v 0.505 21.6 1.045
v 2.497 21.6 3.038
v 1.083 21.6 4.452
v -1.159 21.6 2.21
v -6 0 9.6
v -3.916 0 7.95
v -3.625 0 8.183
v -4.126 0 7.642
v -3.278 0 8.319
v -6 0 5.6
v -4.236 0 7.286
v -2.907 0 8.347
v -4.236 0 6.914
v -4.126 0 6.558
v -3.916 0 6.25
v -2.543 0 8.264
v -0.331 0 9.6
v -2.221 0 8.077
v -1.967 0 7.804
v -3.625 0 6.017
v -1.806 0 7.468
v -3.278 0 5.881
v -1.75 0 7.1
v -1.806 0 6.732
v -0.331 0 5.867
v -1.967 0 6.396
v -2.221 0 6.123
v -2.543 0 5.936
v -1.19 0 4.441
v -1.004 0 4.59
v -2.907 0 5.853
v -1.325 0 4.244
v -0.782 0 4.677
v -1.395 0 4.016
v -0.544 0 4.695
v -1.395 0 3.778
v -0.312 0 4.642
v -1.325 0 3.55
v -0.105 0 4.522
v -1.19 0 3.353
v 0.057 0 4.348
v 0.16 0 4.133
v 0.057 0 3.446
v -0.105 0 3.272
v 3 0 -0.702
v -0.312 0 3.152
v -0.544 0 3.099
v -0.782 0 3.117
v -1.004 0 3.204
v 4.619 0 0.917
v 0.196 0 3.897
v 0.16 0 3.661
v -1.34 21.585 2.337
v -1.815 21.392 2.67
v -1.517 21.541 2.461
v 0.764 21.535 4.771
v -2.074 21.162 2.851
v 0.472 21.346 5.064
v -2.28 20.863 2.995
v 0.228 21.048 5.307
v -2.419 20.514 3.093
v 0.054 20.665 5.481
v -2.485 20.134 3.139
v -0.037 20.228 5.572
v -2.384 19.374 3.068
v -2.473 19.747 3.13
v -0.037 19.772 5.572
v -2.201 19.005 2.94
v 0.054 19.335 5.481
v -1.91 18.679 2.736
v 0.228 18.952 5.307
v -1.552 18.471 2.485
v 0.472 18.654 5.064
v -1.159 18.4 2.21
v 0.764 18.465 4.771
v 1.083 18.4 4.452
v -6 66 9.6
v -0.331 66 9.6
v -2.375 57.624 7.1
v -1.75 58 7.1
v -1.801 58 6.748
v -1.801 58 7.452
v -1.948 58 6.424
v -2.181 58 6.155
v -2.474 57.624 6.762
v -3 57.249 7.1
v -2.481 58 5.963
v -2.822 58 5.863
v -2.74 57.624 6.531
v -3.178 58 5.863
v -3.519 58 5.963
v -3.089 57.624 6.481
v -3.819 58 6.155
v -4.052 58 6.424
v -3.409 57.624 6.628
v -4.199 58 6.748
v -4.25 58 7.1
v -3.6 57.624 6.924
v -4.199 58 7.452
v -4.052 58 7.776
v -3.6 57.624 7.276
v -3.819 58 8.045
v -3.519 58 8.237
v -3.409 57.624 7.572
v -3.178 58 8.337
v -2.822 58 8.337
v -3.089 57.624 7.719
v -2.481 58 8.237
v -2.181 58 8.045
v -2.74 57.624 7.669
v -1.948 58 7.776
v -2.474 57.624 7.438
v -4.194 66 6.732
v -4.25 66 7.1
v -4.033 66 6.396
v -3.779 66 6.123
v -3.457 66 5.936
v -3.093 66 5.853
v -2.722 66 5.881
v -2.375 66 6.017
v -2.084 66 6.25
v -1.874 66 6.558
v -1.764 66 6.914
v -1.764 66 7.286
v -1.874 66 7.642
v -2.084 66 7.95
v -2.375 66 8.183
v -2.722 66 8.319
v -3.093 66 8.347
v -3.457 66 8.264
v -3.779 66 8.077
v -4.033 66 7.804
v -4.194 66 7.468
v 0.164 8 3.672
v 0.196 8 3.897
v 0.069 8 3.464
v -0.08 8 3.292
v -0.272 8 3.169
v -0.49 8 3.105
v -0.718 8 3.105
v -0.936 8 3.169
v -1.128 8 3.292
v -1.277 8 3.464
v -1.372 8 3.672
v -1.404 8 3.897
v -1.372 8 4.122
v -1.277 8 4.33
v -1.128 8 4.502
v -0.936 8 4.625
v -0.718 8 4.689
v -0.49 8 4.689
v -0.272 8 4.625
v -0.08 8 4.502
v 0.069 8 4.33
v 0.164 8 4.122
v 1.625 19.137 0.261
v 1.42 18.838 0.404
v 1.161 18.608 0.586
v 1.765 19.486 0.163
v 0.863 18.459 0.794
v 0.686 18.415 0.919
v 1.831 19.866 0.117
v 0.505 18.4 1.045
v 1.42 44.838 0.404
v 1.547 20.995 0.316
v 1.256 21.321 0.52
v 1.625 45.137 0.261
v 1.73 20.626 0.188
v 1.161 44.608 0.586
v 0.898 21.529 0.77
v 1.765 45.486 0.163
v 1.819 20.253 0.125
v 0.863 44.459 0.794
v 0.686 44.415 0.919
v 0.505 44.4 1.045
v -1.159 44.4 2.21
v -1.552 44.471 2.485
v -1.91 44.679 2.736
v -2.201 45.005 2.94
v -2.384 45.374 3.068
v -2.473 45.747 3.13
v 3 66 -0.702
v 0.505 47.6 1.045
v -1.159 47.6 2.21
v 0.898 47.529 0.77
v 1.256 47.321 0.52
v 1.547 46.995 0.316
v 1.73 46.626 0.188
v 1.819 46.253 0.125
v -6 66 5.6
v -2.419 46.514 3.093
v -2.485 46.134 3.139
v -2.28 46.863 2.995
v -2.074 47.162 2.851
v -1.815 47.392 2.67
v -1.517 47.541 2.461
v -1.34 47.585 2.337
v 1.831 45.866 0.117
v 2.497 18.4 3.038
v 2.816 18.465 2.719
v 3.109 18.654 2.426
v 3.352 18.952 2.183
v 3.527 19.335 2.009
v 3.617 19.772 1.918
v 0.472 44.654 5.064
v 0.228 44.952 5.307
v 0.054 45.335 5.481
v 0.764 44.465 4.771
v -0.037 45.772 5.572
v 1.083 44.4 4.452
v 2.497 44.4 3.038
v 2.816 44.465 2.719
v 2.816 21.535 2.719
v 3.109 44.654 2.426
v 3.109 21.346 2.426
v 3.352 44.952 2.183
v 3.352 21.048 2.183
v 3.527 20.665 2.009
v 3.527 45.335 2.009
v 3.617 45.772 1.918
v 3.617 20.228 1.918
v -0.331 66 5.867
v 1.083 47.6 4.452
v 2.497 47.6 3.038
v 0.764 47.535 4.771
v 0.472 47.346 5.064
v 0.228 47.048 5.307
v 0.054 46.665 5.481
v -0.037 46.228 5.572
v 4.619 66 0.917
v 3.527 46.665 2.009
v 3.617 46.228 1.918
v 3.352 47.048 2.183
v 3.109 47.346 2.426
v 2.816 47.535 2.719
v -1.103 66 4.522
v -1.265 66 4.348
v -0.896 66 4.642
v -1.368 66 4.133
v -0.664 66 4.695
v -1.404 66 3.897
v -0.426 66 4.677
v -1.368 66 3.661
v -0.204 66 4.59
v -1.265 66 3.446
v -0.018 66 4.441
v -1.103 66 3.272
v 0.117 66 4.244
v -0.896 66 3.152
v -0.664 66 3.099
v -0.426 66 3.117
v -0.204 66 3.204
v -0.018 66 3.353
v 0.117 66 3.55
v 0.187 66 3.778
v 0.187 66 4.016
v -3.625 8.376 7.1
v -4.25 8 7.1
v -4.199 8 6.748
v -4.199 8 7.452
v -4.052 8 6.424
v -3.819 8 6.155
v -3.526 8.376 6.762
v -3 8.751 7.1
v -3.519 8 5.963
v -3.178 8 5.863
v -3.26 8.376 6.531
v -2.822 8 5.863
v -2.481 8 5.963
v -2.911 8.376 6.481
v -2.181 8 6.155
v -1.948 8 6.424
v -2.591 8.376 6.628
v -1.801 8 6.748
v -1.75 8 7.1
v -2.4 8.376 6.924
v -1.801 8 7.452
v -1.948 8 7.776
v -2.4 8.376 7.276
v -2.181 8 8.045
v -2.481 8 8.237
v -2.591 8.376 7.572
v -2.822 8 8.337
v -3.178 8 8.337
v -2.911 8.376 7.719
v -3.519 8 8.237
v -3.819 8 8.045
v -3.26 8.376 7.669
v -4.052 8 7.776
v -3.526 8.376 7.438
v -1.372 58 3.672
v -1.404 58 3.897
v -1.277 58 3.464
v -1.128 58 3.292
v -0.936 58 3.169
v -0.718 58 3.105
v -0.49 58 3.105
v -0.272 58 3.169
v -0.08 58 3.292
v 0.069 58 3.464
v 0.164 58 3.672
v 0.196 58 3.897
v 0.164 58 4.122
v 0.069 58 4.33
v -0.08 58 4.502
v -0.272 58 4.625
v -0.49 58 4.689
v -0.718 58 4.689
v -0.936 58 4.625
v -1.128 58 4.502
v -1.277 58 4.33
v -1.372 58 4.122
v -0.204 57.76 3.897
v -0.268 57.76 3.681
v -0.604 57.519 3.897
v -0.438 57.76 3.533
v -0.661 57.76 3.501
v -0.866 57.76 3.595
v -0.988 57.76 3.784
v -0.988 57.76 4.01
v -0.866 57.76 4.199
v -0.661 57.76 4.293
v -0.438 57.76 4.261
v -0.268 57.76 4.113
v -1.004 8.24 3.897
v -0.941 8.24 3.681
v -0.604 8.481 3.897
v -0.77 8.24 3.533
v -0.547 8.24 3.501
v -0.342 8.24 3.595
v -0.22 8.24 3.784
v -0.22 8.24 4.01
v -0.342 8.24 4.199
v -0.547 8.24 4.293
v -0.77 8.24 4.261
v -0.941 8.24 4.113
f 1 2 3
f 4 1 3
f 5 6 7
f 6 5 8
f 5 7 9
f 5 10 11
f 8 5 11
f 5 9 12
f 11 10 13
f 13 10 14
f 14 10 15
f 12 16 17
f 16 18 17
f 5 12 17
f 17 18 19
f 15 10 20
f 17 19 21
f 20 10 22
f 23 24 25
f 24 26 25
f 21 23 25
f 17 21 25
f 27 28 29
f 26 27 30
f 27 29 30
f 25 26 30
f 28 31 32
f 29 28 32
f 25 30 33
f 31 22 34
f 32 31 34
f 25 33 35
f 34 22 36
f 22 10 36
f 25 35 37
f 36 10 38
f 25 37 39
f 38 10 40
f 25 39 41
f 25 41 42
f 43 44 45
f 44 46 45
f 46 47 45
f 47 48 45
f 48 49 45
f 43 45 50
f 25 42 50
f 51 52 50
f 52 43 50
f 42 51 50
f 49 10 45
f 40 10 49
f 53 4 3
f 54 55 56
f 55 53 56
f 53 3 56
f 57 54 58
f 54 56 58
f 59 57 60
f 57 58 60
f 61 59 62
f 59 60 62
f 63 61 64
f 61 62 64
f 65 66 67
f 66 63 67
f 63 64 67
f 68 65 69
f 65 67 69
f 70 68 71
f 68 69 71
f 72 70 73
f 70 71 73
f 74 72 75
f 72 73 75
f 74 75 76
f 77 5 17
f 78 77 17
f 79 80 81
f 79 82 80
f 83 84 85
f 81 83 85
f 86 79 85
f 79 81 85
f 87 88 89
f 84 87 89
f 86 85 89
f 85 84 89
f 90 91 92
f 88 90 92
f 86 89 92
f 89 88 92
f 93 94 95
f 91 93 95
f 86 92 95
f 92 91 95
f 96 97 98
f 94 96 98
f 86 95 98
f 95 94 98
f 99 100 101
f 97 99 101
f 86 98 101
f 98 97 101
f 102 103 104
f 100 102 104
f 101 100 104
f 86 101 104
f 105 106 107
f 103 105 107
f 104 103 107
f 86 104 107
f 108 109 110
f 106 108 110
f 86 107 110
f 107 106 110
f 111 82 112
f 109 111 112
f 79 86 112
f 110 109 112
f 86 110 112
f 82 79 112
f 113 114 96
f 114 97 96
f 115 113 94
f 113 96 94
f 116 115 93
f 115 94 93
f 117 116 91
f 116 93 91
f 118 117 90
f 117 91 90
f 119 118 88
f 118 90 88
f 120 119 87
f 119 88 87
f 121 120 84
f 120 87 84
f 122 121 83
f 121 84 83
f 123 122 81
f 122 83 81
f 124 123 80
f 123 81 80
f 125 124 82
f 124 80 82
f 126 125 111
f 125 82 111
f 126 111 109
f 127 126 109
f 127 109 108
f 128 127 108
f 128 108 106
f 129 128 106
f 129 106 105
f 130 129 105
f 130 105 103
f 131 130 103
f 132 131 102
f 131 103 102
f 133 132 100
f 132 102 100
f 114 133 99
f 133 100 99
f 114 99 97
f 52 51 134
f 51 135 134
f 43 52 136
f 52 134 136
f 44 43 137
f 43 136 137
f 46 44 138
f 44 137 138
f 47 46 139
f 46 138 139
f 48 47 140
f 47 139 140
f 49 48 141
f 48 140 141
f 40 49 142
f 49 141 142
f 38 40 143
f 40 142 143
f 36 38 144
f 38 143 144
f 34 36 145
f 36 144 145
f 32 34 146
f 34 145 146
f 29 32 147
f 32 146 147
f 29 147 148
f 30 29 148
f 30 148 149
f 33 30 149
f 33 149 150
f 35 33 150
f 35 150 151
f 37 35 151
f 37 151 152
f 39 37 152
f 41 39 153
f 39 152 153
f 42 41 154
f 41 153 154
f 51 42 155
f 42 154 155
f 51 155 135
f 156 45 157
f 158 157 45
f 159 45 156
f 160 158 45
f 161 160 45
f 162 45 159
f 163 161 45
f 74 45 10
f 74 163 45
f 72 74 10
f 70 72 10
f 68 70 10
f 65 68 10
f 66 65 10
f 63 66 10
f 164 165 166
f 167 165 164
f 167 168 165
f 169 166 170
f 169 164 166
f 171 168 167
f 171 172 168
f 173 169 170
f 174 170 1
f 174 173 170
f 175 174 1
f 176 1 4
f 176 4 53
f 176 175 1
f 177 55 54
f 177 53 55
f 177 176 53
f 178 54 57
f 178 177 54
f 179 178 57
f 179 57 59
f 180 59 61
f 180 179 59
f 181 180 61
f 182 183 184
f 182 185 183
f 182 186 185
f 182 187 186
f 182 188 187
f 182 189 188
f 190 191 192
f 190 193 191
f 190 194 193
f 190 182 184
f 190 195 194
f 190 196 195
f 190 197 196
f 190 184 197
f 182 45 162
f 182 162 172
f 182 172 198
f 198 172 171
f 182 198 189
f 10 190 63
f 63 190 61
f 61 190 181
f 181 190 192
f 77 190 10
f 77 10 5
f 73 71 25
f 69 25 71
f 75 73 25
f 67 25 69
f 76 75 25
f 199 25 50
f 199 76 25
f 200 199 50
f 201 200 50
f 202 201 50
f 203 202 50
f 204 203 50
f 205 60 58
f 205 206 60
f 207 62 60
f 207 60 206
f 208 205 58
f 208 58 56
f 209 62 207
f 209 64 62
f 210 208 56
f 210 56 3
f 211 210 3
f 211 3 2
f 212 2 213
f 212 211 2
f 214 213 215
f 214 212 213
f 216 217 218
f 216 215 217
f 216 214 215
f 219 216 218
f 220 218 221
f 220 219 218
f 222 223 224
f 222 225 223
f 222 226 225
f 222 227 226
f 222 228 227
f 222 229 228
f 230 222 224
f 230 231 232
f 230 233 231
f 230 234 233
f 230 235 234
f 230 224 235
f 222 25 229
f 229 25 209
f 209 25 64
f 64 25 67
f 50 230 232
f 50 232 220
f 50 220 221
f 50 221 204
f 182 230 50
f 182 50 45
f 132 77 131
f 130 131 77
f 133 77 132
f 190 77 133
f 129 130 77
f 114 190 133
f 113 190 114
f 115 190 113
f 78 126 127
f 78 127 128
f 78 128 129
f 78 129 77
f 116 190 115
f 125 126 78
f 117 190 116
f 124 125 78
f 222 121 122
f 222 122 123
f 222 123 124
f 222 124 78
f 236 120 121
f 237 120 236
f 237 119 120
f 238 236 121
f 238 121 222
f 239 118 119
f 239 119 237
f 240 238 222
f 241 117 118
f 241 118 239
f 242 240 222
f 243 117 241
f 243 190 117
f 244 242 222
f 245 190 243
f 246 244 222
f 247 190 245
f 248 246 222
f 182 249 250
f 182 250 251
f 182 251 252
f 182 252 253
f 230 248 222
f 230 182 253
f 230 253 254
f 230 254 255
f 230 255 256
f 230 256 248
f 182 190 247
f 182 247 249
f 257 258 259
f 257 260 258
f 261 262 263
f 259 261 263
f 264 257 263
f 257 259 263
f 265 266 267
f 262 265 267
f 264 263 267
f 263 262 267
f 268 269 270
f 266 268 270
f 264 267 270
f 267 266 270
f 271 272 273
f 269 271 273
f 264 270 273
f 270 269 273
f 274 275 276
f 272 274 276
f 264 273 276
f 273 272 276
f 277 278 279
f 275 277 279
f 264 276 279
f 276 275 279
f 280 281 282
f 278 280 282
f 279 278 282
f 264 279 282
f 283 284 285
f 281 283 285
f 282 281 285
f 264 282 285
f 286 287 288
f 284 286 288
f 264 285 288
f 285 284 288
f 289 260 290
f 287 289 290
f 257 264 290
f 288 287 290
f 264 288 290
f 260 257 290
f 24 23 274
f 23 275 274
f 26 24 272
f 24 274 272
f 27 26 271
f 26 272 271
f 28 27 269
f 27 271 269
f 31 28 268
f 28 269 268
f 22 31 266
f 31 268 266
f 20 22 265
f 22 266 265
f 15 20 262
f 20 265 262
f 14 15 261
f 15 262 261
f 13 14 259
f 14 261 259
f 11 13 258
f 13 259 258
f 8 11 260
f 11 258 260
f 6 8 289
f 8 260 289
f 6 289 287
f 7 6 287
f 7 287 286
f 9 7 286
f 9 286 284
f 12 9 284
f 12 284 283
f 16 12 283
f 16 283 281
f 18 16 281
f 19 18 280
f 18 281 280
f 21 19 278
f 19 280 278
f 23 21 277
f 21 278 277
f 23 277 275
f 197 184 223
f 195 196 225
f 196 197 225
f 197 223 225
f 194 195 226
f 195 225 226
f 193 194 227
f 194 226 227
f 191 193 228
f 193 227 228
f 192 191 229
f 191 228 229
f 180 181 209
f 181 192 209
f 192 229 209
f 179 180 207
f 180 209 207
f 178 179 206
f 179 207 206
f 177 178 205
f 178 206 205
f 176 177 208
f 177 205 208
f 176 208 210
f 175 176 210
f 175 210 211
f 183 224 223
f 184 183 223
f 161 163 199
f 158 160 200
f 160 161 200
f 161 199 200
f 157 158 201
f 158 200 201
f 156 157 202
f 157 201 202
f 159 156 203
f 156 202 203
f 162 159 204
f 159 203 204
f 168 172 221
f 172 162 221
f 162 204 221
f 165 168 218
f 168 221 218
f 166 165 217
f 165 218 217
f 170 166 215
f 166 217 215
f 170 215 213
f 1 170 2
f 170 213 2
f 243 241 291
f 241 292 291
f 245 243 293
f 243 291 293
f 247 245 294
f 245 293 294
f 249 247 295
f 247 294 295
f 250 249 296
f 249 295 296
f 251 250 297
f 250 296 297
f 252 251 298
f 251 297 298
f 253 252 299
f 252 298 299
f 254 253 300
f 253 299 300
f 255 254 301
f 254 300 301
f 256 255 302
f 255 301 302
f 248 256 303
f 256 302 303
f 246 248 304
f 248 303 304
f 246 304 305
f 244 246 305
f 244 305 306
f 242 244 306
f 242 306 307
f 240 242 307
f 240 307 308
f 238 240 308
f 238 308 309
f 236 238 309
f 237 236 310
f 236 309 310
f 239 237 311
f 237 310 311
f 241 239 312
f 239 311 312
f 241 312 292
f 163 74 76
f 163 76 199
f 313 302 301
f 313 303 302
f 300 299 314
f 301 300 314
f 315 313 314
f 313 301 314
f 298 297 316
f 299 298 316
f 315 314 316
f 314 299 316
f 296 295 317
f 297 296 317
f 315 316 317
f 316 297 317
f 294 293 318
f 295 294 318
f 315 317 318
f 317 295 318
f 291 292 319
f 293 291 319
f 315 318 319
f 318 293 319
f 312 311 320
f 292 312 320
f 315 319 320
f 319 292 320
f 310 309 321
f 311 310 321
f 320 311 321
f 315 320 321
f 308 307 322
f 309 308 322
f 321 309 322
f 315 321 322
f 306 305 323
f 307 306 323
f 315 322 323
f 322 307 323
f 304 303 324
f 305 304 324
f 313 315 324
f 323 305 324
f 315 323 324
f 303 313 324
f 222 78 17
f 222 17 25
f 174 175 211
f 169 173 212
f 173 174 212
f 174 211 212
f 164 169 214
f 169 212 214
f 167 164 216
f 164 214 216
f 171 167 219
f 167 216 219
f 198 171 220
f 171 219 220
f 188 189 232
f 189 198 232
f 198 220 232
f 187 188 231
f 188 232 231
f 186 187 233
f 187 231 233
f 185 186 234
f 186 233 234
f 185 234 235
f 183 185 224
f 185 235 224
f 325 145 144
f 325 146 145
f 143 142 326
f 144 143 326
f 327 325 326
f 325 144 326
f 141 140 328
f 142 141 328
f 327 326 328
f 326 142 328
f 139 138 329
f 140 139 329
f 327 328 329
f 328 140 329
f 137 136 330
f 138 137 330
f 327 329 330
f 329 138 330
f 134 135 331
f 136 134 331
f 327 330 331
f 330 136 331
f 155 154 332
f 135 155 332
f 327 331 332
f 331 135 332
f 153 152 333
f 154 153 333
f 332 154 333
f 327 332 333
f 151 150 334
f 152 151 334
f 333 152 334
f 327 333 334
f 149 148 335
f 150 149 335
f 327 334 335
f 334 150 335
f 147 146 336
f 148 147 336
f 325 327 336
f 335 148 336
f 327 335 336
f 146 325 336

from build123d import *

# Parameters (mm, degrees)
BOSS_EXTRUDE1_DEPTH             = 66
CUT_EXTRUDE1_DEPTH              = 9.653149759
CUT_EXTRUDE2_REACH              = 10.653
F_2_5_2_5_DIAMETER_HOLE1_D      = 2.5
F_2_5_2_5_DIAMETER_HOLE1_DEPTH  = 8
F_2_5_2_5_DIAMETER_HOLE1_TIP    = 0.751075774
TAP_DRILL_FOR_M2X0_4_TAP1_D     = 1.6
TAP_DRILL_FOR_M2X0_4_TAP1_DEPTH = 8
TAP_DRILL_FOR_M2X0_4_TAP1_TIP   = 0.480688495
F_2_5_2_5_DIAMETER_HOLE2_D      = 2.5
F_2_5_2_5_DIAMETER_HOLE2_DEPTH  = 8
F_2_5_2_5_DIAMETER_HOLE2_TIP    = 0.751075774
TAP_DRILL_FOR_M2X0_4_TAP2_D     = 1.6
TAP_DRILL_FOR_M2X0_4_TAP2_DEPTH = 8
TAP_DRILL_FOR_M2X0_4_TAP2_TIP   = 0.480688495


with BuildPart() as part:
    # Sketch1 → Boss-Extrude1 (new body)
    with BuildSketch(Plane(origin=(0, 66, 0), x_dir=(1, 0, 0), z_dir=(0, 1, 0))):
        Polygon((2.999999997, 0.701867841), (-6, -5.599999997), (-6, -9.6), (-0.331046591, -9.6), (-0.331046591, -5.866580498), (4.618700872, -0.916833034), align=None)
    extrude(amount=-BOSS_EXTRUDE1_DEPTH)

    # Sketch2 → Cut-Extrude1 (cut, through all)
    with BuildSketch(Plane(origin=(2.767766953, 0, 2.767766953), x_dir=(0.707106781, 0, -0.707106781), z_dir=(0.707106781, 0, 0.707106781))):
        with BuildLine():
            Line((-0.382384145, 47.599999993), (-2.382384145, 47.599999993))
            ThreePointArc((-2.382384145, 47.599999993), (-3.982384137, 46.000000001), (-2.382384145, 44.400000009))
            Line((-2.382384145, 44.400000009), (-0.382384145, 44.400000009))
            ThreePointArc((-0.382384145, 44.400000009), (1.217615847, 46.000000001), (-0.382384145, 47.599999993))
        make_face()
    extrude(amount=-CUT_EXTRUDE1_DEPTH, mode=Mode.SUBTRACT)

    # Sketch3 → Cut-Extrude2 (cut, up to next)
    with BuildSketch(Plane(origin=(2.767766953, 0, 2.767766953), x_dir=(0.707106781, 0, -0.707106781), z_dir=(0.707106781, 0, 0.707106781)), mode=Mode.PRIVATE) as cut_extrude2_sk1:
        with BuildLine():
            Line((-0.382384145, 21.599999991), (-2.382384145, 21.599999991))
            ThreePointArc((-2.382384145, 21.599999991), (-3.982384137, 19.999999999), (-2.382384145, 18.400000007))
            Line((-2.382384145, 18.400000007), (-0.382384145, 18.400000007))
            ThreePointArc((-0.382384145, 18.400000007), (1.217615847, 19.999999999), (-0.382384145, 21.599999991))
        make_face()
    cut_extrude2_tool1 = extrude(cut_extrude2_sk1.sketch, amount=-CUT_EXTRUDE2_REACH, mode=Mode.PRIVATE) & part.part
    add(cut_extrude2_tool1.solids().sort_by_distance((1.790274, 20, 3.74526))[0], mode=Mode.SUBTRACT)

    # Ø2.5 (2.5) Diameter Hole1
    with Locations(Plane(origin=(0, 0, 0), x_dir=(-1, 0, 0), z_dir=(0, -1, 0))):
        with Locations((3, -7.1)):
            Hole(F_2_5_2_5_DIAMETER_HOLE1_D / 2, depth=F_2_5_2_5_DIAMETER_HOLE1_DEPTH)
            with Locations((0, 0, -(F_2_5_2_5_DIAMETER_HOLE1_DEPTH + F_2_5_2_5_DIAMETER_HOLE1_TIP / 2))):  # 118° drill point
                Cone(0, F_2_5_2_5_DIAMETER_HOLE1_D / 2, F_2_5_2_5_DIAMETER_HOLE1_TIP, mode=Mode.SUBTRACT)

    # Tap Drill for M2x0.4 Tap1
    with Locations(Plane(origin=(0, 0, 0), x_dir=(-1, 0, 0), z_dir=(0, -1, 0))):
        with Locations((0.604004818, -3.897000298)):
            Hole(TAP_DRILL_FOR_M2X0_4_TAP1_D / 2, depth=TAP_DRILL_FOR_M2X0_4_TAP1_DEPTH)
            with Locations((0, 0, -(TAP_DRILL_FOR_M2X0_4_TAP1_DEPTH + TAP_DRILL_FOR_M2X0_4_TAP1_TIP / 2))):  # 118° drill point
                Cone(0, TAP_DRILL_FOR_M2X0_4_TAP1_D / 2, TAP_DRILL_FOR_M2X0_4_TAP1_TIP, mode=Mode.SUBTRACT)

    # Ø2.5 (2.5) Diameter Hole2
    with Locations(Plane(origin=(0, 66, 0), x_dir=(1, 0, 0), z_dir=(0, 1, 0))):
        with Locations((-3, -7.1)):
            Hole(F_2_5_2_5_DIAMETER_HOLE2_D / 2, depth=F_2_5_2_5_DIAMETER_HOLE2_DEPTH)
            with Locations((0, 0, -(F_2_5_2_5_DIAMETER_HOLE2_DEPTH + F_2_5_2_5_DIAMETER_HOLE2_TIP / 2))):  # 118° drill point
                Cone(0, F_2_5_2_5_DIAMETER_HOLE2_D / 2, F_2_5_2_5_DIAMETER_HOLE2_TIP, mode=Mode.SUBTRACT)

    # Tap Drill for M2x0.4 Tap2
    with Locations(Plane(origin=(0, 66, 0), x_dir=(1, 0, 0), z_dir=(0, 1, 0))):
        with Locations((-0.604004818, -3.897000298)):
            Hole(TAP_DRILL_FOR_M2X0_4_TAP2_D / 2, depth=TAP_DRILL_FOR_M2X0_4_TAP2_DEPTH)
            with Locations((0, 0, -(TAP_DRILL_FOR_M2X0_4_TAP2_DEPTH + TAP_DRILL_FOR_M2X0_4_TAP2_TIP / 2))):  # 118° drill point
                Cone(0, TAP_DRILL_FOR_M2X0_4_TAP2_D / 2, TAP_DRILL_FOR_M2X0_4_TAP2_TIP, mode=Mode.SUBTRACT)


solid = part.part
